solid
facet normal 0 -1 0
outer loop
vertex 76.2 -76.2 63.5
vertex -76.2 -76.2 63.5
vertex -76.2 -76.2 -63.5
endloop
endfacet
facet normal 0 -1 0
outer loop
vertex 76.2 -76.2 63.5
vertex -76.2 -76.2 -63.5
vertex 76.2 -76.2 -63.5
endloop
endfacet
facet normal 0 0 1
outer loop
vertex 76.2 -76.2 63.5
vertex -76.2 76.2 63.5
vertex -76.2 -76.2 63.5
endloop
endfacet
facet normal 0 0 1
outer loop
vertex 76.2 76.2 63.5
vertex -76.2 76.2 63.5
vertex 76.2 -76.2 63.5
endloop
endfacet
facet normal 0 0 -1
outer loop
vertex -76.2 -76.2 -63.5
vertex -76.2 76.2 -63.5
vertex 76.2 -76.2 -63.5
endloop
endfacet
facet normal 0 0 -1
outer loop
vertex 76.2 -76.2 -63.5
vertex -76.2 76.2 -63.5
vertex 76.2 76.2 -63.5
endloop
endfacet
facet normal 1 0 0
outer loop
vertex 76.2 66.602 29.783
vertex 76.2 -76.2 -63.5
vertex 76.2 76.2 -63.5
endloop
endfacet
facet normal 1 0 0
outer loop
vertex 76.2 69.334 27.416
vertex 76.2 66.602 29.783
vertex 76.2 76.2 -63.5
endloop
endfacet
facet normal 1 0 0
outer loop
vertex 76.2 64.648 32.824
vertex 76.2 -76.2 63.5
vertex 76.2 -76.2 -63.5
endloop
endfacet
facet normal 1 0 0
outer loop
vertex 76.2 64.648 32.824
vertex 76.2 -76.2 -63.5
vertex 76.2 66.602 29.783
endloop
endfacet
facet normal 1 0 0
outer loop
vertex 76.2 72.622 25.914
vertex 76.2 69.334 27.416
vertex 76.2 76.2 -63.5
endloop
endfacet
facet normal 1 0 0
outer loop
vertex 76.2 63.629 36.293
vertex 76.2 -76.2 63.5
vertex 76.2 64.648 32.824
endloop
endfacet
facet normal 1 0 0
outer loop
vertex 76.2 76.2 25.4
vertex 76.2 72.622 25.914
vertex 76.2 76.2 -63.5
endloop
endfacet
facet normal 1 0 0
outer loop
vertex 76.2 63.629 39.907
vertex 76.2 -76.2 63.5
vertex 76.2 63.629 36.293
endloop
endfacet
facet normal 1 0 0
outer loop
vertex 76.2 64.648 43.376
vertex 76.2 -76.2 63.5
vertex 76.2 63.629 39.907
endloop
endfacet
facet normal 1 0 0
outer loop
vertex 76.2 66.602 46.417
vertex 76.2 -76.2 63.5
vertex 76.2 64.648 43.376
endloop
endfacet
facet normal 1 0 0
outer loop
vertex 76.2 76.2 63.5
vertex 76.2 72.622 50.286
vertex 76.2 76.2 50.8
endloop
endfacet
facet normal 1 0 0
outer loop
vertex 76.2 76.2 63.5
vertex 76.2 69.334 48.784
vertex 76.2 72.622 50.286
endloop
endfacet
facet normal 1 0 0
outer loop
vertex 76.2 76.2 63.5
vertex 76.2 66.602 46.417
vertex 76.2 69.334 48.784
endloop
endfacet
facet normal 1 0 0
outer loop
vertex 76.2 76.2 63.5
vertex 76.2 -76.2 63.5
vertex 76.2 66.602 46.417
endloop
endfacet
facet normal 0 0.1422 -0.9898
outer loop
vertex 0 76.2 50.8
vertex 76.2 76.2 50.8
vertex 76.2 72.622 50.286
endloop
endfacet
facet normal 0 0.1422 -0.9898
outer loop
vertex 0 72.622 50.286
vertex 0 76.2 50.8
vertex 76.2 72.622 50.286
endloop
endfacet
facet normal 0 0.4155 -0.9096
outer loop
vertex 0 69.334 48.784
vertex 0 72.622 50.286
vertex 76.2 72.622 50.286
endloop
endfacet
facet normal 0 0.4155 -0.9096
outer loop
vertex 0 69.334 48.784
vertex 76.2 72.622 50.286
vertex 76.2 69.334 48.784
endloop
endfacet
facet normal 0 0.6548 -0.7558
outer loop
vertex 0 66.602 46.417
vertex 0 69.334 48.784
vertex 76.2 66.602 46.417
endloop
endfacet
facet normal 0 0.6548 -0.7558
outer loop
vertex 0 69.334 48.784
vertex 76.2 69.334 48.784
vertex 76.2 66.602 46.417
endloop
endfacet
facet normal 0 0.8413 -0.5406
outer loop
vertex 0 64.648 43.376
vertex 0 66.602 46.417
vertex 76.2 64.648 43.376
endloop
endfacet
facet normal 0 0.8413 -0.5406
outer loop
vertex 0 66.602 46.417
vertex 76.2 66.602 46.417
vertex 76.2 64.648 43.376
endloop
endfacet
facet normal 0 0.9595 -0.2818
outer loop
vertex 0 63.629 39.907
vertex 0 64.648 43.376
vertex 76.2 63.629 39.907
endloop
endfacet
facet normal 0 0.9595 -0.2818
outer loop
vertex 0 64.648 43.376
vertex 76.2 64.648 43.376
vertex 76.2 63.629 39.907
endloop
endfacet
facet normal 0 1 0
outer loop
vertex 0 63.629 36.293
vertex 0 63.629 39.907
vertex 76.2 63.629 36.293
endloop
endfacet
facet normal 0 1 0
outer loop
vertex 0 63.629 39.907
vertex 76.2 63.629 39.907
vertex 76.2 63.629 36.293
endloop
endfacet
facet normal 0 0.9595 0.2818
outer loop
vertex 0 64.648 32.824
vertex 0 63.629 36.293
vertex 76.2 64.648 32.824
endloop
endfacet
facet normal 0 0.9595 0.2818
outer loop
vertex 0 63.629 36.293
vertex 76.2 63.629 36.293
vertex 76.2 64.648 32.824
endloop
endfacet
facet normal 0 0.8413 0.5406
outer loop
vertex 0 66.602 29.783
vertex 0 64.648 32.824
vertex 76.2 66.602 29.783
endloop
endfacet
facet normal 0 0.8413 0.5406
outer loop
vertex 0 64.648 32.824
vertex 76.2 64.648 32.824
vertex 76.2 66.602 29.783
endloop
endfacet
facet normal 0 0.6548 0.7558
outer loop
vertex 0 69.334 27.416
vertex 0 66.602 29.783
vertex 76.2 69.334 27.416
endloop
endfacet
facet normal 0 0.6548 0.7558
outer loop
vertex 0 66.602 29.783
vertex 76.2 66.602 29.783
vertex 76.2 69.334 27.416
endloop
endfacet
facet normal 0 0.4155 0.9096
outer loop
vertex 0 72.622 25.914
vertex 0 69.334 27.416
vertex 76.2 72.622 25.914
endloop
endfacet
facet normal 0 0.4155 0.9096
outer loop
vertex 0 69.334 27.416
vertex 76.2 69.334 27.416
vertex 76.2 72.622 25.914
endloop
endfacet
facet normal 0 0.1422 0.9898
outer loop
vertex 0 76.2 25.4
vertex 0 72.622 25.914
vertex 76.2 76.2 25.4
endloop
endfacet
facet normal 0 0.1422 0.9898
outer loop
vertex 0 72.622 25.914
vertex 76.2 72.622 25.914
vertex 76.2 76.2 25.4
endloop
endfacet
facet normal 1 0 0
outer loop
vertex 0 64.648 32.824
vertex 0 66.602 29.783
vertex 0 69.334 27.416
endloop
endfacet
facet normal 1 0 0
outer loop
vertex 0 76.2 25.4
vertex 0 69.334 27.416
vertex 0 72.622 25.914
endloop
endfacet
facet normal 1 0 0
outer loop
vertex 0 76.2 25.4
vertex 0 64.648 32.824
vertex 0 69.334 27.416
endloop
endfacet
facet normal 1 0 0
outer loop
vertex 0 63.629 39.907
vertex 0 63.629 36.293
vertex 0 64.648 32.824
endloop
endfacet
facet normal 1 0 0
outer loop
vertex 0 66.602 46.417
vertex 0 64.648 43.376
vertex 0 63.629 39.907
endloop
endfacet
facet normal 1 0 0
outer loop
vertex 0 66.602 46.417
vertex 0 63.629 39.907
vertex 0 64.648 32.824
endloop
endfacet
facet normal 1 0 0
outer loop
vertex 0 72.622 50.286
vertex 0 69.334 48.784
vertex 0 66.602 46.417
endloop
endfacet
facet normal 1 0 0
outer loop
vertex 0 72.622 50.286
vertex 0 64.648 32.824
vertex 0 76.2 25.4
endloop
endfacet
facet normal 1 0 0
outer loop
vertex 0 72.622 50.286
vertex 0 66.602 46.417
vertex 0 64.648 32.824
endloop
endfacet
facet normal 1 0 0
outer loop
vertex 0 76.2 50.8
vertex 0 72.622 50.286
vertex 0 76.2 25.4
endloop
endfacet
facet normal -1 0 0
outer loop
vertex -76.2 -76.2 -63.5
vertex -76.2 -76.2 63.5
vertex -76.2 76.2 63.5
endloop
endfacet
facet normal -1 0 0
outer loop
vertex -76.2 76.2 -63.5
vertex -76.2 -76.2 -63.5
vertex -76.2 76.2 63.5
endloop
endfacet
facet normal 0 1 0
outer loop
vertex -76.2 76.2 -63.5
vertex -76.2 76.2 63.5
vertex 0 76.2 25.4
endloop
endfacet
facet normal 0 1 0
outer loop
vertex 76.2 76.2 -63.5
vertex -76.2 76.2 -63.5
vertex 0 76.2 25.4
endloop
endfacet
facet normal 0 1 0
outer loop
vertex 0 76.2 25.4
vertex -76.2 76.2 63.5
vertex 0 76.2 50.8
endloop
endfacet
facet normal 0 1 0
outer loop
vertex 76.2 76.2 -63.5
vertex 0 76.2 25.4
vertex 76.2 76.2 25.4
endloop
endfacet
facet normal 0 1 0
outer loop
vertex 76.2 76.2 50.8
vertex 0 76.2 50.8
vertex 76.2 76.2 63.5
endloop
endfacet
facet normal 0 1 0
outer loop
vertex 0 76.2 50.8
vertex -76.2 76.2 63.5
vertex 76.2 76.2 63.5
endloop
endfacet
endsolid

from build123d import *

# Parameters (mm, degrees)
F0_W     = 152.4
F0_H     = 152.4
F1_DEPTH = 63.5
F3_DEPTH = 76.2


with BuildPart() as f1:
    # F0 (on Top) → F1 (new body, symmetric)
    with BuildSketch(Plane.XY):
        Rectangle(F0_W, F0_H)
    extrude(amount=F1_DEPTH, both=True)

    # F2 (on face) → F3 (cut)
    with BuildSketch(Plane.YZ.offset(76.2)):
        with BuildLine():
            Line((76.2, 25.4), (76.2, 50.8))
            ThreePointArc((76.2, 50.8), (63.5, 38.1), (76.2, 25.4))
        make_face()
        with BuildLine():
            ThreePointArc((76.2, 25.4), (85.180256, 29.119744), (88.9, 38.1))
            ThreePointArc((88.9, 38.1), (85.180256, 47.080256), (76.2, 50.8))
            Line((76.2, 50.8), (76.2, 25.4))
        make_face()
    extrude(amount=-F3_DEPTH, mode=Mode.SUBTRACT)


solid = f1.part
